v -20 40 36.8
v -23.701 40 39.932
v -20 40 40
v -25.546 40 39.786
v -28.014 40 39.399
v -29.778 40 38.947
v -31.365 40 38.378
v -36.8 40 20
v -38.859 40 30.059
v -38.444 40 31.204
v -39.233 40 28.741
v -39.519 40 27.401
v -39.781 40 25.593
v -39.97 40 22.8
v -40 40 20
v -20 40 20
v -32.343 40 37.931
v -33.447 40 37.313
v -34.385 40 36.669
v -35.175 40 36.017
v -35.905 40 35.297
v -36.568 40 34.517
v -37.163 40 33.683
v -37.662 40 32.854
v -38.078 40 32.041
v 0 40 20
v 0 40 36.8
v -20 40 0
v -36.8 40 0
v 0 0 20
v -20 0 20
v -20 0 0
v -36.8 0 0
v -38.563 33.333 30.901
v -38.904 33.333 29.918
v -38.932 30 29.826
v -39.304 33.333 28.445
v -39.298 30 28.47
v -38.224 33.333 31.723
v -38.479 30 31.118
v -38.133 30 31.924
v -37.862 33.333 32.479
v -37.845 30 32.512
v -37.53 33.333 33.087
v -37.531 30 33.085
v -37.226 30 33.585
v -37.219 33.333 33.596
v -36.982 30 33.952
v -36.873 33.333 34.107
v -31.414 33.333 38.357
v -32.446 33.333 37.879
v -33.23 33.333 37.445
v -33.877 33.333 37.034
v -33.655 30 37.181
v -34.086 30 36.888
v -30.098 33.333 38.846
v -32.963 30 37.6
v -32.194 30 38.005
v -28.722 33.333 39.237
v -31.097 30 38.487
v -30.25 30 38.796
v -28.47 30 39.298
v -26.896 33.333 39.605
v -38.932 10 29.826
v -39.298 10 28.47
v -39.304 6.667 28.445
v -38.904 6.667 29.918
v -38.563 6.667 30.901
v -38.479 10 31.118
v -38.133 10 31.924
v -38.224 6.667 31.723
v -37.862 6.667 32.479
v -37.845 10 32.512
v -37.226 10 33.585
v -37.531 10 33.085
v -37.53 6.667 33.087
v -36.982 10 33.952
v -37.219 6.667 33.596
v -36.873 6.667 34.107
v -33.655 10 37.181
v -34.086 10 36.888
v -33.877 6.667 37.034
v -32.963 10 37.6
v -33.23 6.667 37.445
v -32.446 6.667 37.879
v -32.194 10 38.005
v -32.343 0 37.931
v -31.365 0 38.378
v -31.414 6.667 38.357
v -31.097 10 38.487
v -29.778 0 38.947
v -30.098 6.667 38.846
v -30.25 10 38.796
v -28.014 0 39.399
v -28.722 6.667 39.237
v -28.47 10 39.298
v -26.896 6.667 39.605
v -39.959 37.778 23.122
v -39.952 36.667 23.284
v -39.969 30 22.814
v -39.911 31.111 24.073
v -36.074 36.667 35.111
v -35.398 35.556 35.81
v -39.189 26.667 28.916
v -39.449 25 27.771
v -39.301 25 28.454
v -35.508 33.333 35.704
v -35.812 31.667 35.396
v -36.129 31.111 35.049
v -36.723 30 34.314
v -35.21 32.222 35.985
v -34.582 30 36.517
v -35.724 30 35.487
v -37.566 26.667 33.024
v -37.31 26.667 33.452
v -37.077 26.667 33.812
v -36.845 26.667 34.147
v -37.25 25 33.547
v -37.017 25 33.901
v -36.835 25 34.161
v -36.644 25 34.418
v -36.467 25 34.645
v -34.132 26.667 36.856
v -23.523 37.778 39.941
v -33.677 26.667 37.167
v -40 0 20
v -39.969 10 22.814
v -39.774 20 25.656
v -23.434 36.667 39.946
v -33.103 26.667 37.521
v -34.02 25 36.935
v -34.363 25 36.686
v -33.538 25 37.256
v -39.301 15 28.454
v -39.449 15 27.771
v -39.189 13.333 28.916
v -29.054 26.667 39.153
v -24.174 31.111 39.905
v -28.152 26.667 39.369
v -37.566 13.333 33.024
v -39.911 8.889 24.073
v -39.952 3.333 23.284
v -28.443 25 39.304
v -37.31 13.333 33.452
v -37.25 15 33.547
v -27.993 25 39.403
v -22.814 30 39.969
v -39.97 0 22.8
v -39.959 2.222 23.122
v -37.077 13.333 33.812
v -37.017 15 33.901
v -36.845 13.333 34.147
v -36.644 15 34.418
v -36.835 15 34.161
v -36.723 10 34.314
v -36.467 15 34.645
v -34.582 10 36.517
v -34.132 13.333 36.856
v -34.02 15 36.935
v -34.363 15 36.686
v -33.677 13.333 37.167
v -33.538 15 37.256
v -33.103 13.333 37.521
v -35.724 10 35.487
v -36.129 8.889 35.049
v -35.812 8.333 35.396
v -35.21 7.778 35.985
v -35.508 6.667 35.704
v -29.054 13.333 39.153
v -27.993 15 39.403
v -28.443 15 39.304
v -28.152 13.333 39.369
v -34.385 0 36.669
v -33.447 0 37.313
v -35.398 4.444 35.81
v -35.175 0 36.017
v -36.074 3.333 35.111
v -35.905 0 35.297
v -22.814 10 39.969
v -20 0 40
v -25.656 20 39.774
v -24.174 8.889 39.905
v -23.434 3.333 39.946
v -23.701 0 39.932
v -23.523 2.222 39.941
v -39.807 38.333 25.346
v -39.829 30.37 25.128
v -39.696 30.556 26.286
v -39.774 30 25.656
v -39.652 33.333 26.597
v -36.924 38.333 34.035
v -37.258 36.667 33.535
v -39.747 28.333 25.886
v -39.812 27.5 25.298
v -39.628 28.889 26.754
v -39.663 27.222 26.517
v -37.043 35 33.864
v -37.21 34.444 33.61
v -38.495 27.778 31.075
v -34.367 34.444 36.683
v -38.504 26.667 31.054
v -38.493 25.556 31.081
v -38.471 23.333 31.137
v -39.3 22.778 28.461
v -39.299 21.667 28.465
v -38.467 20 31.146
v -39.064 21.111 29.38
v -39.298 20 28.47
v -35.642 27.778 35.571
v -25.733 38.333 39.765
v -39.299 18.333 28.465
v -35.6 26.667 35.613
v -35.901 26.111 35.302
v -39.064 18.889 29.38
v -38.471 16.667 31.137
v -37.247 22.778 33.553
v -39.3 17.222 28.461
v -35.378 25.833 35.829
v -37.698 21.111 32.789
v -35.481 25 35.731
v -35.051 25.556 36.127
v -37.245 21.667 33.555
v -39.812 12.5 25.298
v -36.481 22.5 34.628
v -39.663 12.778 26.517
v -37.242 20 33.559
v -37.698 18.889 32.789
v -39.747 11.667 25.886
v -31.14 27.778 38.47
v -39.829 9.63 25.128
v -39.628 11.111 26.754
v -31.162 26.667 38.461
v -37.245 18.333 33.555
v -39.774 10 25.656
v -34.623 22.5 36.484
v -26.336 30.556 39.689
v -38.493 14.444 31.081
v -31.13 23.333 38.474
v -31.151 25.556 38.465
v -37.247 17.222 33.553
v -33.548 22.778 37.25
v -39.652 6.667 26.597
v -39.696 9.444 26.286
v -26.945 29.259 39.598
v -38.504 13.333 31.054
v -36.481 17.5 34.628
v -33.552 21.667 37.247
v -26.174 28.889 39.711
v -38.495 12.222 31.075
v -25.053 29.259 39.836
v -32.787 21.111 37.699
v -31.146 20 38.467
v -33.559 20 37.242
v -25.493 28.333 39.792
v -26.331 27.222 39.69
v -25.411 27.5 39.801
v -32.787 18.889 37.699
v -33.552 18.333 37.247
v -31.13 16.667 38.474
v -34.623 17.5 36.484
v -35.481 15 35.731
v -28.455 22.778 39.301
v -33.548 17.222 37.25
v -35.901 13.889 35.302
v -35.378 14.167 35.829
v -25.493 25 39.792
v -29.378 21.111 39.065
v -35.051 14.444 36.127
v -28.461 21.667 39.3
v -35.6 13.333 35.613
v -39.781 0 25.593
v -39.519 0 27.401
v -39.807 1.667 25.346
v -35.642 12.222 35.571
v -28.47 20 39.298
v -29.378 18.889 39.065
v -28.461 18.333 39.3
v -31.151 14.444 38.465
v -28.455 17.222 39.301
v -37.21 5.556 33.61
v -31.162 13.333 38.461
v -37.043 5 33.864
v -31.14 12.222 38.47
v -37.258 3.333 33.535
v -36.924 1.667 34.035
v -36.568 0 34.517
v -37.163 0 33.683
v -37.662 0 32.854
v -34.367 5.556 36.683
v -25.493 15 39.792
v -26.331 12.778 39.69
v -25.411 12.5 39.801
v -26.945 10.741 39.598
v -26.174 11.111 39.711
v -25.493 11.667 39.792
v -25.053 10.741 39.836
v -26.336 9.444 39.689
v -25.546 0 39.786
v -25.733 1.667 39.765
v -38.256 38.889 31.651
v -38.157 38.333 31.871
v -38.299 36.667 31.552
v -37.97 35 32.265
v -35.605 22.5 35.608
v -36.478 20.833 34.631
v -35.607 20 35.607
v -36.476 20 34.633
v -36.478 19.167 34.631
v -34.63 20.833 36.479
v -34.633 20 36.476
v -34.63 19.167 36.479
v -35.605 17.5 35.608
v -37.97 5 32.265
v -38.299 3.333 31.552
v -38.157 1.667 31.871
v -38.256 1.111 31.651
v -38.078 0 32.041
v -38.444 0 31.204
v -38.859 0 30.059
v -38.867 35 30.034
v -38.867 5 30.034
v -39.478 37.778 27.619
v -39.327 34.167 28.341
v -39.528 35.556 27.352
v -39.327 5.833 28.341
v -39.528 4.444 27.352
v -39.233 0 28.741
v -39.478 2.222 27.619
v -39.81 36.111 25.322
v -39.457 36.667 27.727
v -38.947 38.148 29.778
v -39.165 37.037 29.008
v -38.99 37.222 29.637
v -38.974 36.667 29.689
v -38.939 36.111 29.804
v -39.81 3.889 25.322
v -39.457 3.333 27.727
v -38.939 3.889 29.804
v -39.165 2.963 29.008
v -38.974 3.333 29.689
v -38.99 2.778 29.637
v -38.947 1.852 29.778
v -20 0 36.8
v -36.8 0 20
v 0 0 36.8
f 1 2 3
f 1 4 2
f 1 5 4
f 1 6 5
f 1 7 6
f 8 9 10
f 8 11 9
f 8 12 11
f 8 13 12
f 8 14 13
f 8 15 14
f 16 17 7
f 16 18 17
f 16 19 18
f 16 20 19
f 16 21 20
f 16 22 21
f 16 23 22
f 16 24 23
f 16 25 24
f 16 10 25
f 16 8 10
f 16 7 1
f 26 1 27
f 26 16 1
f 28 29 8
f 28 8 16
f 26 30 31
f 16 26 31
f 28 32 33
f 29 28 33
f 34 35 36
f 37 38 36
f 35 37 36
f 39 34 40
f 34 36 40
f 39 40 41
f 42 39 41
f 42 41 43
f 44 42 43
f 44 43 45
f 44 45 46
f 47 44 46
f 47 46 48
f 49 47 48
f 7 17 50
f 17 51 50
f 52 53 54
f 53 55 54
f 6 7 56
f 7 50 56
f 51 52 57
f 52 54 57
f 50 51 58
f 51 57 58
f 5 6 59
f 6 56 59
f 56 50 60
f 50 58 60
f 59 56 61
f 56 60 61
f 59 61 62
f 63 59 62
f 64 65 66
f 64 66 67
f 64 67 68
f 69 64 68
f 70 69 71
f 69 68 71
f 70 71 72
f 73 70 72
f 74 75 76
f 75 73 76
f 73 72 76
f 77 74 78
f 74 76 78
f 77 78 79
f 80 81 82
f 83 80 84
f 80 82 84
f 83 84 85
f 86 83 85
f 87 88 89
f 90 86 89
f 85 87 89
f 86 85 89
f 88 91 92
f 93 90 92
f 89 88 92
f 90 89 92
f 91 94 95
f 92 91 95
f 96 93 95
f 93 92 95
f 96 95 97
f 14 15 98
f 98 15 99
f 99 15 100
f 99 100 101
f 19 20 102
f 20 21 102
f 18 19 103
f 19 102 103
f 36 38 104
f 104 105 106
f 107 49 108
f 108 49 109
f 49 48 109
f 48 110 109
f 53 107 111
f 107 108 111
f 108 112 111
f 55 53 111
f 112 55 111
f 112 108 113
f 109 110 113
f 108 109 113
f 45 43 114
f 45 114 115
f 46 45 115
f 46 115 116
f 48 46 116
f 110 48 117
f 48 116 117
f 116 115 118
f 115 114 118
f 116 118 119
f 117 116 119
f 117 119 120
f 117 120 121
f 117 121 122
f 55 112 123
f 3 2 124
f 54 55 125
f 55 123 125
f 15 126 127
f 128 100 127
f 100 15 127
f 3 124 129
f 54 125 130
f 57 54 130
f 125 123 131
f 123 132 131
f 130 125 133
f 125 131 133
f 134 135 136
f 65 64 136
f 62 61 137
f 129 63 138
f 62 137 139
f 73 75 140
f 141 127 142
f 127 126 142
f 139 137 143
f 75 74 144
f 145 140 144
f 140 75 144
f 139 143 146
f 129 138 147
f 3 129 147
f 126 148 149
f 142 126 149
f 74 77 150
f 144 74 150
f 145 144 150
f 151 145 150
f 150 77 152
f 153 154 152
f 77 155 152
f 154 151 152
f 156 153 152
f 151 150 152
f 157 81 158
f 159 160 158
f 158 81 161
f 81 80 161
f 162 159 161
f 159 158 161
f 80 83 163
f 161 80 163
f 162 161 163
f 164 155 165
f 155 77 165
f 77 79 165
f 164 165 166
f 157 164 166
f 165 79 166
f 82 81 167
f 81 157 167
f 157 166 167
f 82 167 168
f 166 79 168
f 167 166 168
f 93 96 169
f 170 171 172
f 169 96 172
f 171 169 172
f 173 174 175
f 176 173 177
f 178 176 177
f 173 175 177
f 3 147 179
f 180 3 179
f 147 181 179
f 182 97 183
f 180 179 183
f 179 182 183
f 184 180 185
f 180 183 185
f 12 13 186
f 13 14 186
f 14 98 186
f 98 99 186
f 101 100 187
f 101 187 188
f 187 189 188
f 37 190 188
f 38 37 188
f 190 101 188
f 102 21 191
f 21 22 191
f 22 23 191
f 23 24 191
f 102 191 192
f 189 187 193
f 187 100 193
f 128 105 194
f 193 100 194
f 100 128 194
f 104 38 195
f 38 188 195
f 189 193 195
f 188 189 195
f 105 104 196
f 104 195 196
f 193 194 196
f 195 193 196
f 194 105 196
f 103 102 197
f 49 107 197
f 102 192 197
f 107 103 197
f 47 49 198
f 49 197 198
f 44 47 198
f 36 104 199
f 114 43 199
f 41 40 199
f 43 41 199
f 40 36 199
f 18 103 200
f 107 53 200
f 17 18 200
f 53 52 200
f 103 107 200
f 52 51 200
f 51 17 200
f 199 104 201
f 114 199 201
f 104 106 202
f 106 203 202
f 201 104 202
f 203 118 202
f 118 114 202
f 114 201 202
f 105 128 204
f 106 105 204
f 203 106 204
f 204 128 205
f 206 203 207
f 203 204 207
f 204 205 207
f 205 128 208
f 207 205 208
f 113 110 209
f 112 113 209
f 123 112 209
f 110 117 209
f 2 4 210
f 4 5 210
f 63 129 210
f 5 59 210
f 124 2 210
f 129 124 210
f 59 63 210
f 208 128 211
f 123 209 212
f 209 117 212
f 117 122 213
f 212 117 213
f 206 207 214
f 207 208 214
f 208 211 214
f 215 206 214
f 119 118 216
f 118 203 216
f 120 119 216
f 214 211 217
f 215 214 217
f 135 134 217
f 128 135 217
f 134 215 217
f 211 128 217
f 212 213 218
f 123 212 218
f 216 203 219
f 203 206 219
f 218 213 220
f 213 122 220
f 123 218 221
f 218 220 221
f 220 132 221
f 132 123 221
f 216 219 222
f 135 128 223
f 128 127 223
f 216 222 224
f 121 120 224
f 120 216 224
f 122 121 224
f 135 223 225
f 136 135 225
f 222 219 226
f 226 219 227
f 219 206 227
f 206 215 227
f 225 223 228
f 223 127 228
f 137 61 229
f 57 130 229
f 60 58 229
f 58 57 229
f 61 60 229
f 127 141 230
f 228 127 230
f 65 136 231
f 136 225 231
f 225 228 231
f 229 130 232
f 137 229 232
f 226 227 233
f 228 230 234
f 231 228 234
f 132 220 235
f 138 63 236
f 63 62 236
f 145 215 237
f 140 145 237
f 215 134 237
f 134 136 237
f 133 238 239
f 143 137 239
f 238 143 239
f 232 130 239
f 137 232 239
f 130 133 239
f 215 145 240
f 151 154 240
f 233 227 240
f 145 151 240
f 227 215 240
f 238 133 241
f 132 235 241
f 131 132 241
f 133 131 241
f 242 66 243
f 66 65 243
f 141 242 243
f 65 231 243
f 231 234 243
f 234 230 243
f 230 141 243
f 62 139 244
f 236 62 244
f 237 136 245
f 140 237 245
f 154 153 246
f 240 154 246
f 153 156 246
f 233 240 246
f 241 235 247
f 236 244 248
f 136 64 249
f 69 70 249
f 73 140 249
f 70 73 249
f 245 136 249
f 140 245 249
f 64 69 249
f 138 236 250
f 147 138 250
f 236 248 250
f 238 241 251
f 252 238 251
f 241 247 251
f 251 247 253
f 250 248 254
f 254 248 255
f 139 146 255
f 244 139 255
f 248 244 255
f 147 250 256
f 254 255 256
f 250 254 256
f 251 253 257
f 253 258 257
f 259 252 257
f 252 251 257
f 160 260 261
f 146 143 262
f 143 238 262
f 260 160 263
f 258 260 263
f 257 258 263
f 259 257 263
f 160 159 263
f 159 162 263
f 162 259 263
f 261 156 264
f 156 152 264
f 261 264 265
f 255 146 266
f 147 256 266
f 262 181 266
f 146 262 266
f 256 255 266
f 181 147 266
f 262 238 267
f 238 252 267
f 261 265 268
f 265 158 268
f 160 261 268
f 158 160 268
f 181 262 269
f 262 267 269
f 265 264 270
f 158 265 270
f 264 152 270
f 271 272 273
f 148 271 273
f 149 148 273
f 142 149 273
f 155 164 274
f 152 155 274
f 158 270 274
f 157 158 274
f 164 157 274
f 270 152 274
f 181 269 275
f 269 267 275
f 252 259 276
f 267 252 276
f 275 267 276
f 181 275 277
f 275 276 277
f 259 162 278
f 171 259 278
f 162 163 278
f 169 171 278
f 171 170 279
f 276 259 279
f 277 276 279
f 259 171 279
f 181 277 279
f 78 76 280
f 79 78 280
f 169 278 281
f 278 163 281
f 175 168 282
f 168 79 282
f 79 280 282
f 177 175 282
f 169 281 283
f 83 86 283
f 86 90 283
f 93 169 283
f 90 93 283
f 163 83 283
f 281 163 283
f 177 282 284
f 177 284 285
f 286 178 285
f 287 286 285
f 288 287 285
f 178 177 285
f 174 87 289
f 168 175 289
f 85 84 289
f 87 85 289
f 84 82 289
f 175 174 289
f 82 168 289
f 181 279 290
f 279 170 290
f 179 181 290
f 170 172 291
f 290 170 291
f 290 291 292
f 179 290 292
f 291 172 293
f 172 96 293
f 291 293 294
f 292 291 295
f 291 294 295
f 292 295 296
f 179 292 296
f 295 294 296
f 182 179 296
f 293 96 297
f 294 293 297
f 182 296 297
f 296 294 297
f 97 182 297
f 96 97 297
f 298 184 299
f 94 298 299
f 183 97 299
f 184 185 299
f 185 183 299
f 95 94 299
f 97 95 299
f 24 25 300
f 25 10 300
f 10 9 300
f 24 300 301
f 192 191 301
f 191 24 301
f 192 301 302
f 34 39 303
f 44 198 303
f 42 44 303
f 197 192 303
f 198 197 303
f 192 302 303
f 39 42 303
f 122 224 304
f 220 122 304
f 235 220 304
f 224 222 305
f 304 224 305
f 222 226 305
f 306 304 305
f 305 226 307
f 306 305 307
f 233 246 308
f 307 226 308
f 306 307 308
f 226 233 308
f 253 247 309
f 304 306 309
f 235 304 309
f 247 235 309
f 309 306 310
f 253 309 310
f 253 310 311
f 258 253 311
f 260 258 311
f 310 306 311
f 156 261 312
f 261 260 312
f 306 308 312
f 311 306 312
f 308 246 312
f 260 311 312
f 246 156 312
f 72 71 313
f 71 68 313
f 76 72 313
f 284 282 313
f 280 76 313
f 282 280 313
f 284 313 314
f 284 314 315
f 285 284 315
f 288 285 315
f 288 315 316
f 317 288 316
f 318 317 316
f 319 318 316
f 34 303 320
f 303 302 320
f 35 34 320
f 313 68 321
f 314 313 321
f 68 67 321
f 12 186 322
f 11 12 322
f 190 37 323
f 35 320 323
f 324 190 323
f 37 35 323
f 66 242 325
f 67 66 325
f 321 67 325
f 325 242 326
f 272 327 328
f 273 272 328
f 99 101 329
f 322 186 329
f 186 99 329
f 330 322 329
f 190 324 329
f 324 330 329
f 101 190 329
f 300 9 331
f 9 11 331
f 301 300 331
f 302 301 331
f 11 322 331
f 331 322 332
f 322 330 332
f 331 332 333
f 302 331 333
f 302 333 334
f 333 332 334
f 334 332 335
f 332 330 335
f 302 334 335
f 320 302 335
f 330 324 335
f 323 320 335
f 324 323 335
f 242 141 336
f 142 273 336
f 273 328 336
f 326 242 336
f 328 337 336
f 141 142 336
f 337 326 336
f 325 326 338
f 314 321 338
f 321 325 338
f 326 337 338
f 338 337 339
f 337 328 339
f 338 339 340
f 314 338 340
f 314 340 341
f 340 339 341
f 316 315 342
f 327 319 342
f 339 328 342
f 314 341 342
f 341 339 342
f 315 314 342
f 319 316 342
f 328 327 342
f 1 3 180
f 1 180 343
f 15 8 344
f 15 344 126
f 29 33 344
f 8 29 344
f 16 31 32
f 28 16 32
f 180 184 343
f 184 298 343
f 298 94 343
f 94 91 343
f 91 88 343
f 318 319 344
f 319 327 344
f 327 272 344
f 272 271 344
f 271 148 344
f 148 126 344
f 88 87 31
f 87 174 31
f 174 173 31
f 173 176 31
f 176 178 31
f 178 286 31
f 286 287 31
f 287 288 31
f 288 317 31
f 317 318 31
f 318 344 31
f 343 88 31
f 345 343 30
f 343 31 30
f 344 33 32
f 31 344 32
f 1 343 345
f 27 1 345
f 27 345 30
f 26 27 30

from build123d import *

# Parameters (mm, degrees)
BOSS_EXTRUDE1_DEPTH = 40
FILLET1_SIZE        = 20


with BuildPart() as part:
    # Sketch2 → Boss-Extrude1 (new body)
    with BuildSketch(Plane(origin=(0, 0, 0), x_dir=(1, 0, 0), z_dir=(0, 1, 0))):
        Polygon((-20, -40), (-20, -36.8), (0, -36.8), (0, -20), (-20, -20), (-20, 0), (-36.8, 0), (-36.8, -20), (-40, -20), (-40, -40), align=None)
    extrude(amount=BOSS_EXTRUDE1_DEPTH)

    # Fillet1
    # a fillet whose section is not a circle: 20 mm, written as the material it takes off along each edge
    with BuildSketch(Plane(origin=(-40, -50, 40), x_dir=(0, 0, -1), z_dir=(0, 1, 0))) as fillet1_piece_1:
        with BuildLine():
            add(Edge.make_bspline([(FILLET1_SIZE, 0), (FILLET1_SIZE * 0.831801948466, 0), (FILLET1_SIZE * 0.663603896932, 0), (FILLET1_SIZE * 0.292893218813, -FILLET1_SIZE * 0.0716919198361), (FILLET1_SIZE * 0.0716919198361, -FILLET1_SIZE * 0.292893218813), (0, -FILLET1_SIZE * 0.663603896932), (0, -FILLET1_SIZE * 0.831801948466), (0, -FILLET1_SIZE)], knots=[0, 0, 0, 0, 0, 0, 0.5, 0.5, 1, 1, 1, 1, 1, 1], degree=5))
            Line((0, -FILLET1_SIZE), (0, 0))
            Line((0, 0), (FILLET1_SIZE, 0))
        make_face()
    extrude(amount=140, mode=Mode.SUBTRACT)


solid = part.part
